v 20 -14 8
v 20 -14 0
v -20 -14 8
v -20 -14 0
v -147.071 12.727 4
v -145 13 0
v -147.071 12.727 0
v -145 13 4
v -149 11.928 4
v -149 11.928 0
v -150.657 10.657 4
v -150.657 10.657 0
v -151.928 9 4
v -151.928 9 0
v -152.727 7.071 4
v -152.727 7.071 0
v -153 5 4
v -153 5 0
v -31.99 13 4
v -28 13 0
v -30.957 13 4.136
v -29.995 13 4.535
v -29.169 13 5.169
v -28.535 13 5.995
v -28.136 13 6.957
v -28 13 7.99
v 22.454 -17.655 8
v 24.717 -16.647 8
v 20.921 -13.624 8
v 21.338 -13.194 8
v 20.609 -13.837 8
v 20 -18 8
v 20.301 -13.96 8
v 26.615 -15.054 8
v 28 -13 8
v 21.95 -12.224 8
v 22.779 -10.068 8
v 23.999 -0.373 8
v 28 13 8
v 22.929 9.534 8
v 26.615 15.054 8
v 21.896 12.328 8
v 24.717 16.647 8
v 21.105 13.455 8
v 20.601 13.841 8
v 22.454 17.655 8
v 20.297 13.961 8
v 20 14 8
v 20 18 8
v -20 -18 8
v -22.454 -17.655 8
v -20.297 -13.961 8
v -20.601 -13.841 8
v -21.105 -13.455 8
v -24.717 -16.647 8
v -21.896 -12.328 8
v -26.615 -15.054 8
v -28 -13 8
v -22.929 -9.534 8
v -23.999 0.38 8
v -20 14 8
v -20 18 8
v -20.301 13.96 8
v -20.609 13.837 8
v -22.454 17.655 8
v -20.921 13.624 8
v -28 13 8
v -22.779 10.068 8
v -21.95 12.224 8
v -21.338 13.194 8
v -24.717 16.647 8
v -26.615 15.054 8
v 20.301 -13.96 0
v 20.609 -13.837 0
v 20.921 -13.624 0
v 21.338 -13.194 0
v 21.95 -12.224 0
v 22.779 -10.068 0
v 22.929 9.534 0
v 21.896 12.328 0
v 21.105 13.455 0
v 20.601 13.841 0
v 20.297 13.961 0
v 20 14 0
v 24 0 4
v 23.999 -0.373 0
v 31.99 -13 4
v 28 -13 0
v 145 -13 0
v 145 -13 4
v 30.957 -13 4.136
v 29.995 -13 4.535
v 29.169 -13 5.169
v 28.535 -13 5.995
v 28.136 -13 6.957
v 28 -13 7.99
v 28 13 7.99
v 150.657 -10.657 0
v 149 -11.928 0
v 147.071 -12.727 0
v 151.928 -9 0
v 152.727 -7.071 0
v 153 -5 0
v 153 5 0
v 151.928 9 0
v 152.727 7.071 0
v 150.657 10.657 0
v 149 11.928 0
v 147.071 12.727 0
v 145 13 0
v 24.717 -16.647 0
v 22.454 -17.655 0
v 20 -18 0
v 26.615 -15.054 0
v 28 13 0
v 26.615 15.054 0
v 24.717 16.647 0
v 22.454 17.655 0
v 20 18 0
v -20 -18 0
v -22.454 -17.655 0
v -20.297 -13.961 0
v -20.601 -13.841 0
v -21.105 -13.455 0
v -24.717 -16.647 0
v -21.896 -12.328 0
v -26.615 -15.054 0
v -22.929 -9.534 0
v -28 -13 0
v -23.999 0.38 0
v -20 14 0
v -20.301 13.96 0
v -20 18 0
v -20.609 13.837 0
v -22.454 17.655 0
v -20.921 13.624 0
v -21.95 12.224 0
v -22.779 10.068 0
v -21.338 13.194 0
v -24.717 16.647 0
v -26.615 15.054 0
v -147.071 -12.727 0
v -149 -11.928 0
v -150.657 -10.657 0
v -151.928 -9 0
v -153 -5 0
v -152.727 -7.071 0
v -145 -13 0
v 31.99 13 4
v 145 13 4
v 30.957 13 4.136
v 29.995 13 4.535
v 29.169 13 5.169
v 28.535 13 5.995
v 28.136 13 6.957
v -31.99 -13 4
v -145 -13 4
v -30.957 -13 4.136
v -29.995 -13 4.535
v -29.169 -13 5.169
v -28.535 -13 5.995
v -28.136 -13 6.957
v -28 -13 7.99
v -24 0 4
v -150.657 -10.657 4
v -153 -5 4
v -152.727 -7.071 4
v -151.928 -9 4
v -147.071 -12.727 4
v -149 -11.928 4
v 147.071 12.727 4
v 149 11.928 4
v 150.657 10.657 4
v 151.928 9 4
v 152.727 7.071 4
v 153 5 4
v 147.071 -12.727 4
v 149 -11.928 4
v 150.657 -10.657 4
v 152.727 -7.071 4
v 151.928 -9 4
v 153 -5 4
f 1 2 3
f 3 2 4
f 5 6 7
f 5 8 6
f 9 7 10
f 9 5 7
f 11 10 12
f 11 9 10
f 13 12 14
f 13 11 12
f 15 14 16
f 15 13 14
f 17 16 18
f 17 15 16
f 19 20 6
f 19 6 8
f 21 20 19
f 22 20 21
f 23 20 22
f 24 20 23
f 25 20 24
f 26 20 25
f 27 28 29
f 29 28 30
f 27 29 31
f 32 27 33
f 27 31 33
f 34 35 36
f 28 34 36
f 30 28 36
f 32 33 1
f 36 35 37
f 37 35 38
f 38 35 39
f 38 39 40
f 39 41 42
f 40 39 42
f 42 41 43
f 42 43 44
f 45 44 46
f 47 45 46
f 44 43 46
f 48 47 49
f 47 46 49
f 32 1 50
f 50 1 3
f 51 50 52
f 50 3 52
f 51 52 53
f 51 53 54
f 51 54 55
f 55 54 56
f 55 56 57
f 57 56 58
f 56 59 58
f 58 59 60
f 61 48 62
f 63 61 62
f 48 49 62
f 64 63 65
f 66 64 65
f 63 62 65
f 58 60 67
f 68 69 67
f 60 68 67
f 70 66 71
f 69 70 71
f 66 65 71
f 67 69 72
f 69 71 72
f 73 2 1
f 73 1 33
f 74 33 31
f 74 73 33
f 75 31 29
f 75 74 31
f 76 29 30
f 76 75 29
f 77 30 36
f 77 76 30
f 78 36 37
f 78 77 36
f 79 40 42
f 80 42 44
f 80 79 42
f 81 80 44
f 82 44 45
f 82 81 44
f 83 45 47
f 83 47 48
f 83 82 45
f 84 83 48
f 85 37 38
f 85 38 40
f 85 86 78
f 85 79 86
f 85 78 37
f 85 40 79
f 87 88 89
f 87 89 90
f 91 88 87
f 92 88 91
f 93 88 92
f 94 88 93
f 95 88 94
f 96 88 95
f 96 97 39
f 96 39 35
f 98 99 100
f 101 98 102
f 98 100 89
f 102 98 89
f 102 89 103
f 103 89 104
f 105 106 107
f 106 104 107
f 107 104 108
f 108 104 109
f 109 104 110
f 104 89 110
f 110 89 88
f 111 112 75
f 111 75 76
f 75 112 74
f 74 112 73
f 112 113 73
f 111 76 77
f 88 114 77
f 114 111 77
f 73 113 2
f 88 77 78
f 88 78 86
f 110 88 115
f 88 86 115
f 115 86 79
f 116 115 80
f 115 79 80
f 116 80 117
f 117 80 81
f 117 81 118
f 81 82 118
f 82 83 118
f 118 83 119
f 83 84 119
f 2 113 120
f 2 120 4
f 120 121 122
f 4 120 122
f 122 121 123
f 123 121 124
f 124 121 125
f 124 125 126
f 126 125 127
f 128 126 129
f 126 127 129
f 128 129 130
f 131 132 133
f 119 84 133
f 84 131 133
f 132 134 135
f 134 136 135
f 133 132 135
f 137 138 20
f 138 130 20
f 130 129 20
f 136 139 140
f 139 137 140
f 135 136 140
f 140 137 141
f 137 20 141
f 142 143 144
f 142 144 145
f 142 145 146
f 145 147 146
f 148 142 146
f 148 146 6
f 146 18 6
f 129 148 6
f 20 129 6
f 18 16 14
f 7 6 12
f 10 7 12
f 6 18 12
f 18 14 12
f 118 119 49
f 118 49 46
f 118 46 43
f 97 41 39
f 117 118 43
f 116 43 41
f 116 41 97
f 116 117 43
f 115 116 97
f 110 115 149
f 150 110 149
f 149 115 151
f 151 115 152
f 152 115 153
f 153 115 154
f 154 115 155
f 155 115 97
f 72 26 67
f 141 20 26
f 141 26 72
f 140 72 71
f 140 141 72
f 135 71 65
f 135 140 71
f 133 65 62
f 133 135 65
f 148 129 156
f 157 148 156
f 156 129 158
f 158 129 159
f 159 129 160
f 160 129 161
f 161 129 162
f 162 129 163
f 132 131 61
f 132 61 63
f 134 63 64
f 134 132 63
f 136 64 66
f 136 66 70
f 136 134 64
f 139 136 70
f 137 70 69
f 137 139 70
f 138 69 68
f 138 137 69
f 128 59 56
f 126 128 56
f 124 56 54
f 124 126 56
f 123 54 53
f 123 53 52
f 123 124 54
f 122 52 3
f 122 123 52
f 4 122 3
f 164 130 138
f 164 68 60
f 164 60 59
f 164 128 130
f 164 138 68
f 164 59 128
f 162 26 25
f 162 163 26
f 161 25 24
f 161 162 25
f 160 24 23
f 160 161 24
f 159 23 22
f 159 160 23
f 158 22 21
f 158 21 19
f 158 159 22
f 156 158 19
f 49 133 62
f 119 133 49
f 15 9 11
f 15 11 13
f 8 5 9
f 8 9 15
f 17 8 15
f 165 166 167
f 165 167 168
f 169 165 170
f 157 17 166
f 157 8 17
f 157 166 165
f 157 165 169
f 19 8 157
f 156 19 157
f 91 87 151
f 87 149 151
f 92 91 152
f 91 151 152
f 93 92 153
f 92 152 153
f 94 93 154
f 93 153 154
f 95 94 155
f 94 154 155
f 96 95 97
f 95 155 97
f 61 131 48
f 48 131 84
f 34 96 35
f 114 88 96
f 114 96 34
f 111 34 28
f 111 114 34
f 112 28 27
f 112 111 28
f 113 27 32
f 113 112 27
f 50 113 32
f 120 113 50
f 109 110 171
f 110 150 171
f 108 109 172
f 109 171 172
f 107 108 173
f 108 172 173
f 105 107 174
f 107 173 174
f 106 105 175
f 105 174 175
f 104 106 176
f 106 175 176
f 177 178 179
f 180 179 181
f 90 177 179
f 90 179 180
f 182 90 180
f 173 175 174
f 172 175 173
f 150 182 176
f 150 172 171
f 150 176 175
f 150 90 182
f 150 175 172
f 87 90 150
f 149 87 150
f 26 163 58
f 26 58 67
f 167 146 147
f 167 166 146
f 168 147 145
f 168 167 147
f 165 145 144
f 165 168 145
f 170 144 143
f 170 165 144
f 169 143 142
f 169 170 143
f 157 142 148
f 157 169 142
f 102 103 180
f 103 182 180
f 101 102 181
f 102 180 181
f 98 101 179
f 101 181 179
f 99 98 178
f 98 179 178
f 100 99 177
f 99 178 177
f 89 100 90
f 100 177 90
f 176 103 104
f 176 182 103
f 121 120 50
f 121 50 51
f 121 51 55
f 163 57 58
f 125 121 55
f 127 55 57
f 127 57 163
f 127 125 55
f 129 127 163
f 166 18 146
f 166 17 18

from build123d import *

# Parameters (mm, degrees)
PAD_DEPTH    = 8
SKETCH001_W  = 26
SKETCH001_H  = 4
PAD001_DEPTH = 125
SKETCH002_W  = 26
SKETCH002_H  = 4
PAD002_DEPTH = 125
FILLET_R     = 3.99
FILLET001_R  = 3.99
FILLET002_R  = 8
FILLET003_R  = 8


with BuildPart() as part:
    # Sketch → Pad (new body)
    with BuildSketch(Plane.XY):
        with BuildLine():
            ThreePointArc((-28, 13), (-24.716991, 16.647185), (-20, 18))
            Line((-20, 18), (20, 18))
            ThreePointArc((20, 18), (24.716991, 16.647185), (28, 13))
            Line((28, 13), (28, -13))
            ThreePointArc((28, -13), (24.716991, -16.647185), (20, -18))
            Line((20, -18), (-20, -18))
            ThreePointArc((-20, -18), (-24.716991, -16.647185), (-28, -13))
            Line((-28, -13), (-28, 13))
        make_face()
        with BuildLine():
            add(Edge.make_bspline(
                [(-20, 14), (-24, 14), (-24, 0), (-24, -14), (-20, -14)],
                knots=[3.141593, 3.141593, 3.141593, 4.712389, 4.712389, 6.283185, 6.283185, 6.283185], degree=2, weights=[1, 0.707107, 1, 0.707107, 1]))
            Line((-20, 14), (20, 14))
            add(Edge.make_bspline(
                [(20, -14), (24, -14), (24, 0), (24, 14), (20, 14)],
                knots=[0, 0, 0, 1.570796, 1.570796, 3.141593, 3.141593, 3.141593], degree=2, weights=[1, 0.707107, 1, 0.707107, 1]))
            Line((20, -14), (-20, -14))
        make_face(mode=Mode.SUBTRACT)
    extrude(amount=PAD_DEPTH)

    # Sketch001 → Pad001 (new body)
    with BuildSketch(Plane(origin=(-28, 0, 0), x_dir=(0, -1, 0), z_dir=(-1, 0, 0))):
        with Locations((0, 2)):
            Rectangle(SKETCH001_W, SKETCH001_H)
    extrude(amount=PAD001_DEPTH)

    # Sketch002 → Pad002 (new body)
    with BuildSketch(Plane.YZ.offset(28)):
        with Locations((0, 2)):
            Rectangle(SKETCH002_W, SKETCH002_H)
    extrude(amount=PAD002_DEPTH)

    # Fillet
    fillet_edges = [part.edges().sort_by_distance(p)[0] for p in [
        (-28, 0, 4),
    ]]
    fillet(fillet_edges, radius=FILLET_R)

    # Fillet001
    fillet001_edges = [part.edges().sort_by_distance(p)[0] for p in [
        (28, 0, 4),
    ]]
    fillet(fillet001_edges, radius=FILLET001_R)

    # Fillet002
    fillet002_edges = [part.edges().sort_by_distance(p)[0] for p in [
        (-153, 13, 2),
        (-153, -13, 2),
    ]]
    fillet(fillet002_edges, radius=FILLET002_R)

    # Fillet003
    fillet003_edges = [part.edges().sort_by_distance(p)[0] for p in [
        (153, 13, 2),
        (153, -13, 2),
    ]]
    fillet(fillet003_edges, radius=FILLET003_R)


solid = part.part
